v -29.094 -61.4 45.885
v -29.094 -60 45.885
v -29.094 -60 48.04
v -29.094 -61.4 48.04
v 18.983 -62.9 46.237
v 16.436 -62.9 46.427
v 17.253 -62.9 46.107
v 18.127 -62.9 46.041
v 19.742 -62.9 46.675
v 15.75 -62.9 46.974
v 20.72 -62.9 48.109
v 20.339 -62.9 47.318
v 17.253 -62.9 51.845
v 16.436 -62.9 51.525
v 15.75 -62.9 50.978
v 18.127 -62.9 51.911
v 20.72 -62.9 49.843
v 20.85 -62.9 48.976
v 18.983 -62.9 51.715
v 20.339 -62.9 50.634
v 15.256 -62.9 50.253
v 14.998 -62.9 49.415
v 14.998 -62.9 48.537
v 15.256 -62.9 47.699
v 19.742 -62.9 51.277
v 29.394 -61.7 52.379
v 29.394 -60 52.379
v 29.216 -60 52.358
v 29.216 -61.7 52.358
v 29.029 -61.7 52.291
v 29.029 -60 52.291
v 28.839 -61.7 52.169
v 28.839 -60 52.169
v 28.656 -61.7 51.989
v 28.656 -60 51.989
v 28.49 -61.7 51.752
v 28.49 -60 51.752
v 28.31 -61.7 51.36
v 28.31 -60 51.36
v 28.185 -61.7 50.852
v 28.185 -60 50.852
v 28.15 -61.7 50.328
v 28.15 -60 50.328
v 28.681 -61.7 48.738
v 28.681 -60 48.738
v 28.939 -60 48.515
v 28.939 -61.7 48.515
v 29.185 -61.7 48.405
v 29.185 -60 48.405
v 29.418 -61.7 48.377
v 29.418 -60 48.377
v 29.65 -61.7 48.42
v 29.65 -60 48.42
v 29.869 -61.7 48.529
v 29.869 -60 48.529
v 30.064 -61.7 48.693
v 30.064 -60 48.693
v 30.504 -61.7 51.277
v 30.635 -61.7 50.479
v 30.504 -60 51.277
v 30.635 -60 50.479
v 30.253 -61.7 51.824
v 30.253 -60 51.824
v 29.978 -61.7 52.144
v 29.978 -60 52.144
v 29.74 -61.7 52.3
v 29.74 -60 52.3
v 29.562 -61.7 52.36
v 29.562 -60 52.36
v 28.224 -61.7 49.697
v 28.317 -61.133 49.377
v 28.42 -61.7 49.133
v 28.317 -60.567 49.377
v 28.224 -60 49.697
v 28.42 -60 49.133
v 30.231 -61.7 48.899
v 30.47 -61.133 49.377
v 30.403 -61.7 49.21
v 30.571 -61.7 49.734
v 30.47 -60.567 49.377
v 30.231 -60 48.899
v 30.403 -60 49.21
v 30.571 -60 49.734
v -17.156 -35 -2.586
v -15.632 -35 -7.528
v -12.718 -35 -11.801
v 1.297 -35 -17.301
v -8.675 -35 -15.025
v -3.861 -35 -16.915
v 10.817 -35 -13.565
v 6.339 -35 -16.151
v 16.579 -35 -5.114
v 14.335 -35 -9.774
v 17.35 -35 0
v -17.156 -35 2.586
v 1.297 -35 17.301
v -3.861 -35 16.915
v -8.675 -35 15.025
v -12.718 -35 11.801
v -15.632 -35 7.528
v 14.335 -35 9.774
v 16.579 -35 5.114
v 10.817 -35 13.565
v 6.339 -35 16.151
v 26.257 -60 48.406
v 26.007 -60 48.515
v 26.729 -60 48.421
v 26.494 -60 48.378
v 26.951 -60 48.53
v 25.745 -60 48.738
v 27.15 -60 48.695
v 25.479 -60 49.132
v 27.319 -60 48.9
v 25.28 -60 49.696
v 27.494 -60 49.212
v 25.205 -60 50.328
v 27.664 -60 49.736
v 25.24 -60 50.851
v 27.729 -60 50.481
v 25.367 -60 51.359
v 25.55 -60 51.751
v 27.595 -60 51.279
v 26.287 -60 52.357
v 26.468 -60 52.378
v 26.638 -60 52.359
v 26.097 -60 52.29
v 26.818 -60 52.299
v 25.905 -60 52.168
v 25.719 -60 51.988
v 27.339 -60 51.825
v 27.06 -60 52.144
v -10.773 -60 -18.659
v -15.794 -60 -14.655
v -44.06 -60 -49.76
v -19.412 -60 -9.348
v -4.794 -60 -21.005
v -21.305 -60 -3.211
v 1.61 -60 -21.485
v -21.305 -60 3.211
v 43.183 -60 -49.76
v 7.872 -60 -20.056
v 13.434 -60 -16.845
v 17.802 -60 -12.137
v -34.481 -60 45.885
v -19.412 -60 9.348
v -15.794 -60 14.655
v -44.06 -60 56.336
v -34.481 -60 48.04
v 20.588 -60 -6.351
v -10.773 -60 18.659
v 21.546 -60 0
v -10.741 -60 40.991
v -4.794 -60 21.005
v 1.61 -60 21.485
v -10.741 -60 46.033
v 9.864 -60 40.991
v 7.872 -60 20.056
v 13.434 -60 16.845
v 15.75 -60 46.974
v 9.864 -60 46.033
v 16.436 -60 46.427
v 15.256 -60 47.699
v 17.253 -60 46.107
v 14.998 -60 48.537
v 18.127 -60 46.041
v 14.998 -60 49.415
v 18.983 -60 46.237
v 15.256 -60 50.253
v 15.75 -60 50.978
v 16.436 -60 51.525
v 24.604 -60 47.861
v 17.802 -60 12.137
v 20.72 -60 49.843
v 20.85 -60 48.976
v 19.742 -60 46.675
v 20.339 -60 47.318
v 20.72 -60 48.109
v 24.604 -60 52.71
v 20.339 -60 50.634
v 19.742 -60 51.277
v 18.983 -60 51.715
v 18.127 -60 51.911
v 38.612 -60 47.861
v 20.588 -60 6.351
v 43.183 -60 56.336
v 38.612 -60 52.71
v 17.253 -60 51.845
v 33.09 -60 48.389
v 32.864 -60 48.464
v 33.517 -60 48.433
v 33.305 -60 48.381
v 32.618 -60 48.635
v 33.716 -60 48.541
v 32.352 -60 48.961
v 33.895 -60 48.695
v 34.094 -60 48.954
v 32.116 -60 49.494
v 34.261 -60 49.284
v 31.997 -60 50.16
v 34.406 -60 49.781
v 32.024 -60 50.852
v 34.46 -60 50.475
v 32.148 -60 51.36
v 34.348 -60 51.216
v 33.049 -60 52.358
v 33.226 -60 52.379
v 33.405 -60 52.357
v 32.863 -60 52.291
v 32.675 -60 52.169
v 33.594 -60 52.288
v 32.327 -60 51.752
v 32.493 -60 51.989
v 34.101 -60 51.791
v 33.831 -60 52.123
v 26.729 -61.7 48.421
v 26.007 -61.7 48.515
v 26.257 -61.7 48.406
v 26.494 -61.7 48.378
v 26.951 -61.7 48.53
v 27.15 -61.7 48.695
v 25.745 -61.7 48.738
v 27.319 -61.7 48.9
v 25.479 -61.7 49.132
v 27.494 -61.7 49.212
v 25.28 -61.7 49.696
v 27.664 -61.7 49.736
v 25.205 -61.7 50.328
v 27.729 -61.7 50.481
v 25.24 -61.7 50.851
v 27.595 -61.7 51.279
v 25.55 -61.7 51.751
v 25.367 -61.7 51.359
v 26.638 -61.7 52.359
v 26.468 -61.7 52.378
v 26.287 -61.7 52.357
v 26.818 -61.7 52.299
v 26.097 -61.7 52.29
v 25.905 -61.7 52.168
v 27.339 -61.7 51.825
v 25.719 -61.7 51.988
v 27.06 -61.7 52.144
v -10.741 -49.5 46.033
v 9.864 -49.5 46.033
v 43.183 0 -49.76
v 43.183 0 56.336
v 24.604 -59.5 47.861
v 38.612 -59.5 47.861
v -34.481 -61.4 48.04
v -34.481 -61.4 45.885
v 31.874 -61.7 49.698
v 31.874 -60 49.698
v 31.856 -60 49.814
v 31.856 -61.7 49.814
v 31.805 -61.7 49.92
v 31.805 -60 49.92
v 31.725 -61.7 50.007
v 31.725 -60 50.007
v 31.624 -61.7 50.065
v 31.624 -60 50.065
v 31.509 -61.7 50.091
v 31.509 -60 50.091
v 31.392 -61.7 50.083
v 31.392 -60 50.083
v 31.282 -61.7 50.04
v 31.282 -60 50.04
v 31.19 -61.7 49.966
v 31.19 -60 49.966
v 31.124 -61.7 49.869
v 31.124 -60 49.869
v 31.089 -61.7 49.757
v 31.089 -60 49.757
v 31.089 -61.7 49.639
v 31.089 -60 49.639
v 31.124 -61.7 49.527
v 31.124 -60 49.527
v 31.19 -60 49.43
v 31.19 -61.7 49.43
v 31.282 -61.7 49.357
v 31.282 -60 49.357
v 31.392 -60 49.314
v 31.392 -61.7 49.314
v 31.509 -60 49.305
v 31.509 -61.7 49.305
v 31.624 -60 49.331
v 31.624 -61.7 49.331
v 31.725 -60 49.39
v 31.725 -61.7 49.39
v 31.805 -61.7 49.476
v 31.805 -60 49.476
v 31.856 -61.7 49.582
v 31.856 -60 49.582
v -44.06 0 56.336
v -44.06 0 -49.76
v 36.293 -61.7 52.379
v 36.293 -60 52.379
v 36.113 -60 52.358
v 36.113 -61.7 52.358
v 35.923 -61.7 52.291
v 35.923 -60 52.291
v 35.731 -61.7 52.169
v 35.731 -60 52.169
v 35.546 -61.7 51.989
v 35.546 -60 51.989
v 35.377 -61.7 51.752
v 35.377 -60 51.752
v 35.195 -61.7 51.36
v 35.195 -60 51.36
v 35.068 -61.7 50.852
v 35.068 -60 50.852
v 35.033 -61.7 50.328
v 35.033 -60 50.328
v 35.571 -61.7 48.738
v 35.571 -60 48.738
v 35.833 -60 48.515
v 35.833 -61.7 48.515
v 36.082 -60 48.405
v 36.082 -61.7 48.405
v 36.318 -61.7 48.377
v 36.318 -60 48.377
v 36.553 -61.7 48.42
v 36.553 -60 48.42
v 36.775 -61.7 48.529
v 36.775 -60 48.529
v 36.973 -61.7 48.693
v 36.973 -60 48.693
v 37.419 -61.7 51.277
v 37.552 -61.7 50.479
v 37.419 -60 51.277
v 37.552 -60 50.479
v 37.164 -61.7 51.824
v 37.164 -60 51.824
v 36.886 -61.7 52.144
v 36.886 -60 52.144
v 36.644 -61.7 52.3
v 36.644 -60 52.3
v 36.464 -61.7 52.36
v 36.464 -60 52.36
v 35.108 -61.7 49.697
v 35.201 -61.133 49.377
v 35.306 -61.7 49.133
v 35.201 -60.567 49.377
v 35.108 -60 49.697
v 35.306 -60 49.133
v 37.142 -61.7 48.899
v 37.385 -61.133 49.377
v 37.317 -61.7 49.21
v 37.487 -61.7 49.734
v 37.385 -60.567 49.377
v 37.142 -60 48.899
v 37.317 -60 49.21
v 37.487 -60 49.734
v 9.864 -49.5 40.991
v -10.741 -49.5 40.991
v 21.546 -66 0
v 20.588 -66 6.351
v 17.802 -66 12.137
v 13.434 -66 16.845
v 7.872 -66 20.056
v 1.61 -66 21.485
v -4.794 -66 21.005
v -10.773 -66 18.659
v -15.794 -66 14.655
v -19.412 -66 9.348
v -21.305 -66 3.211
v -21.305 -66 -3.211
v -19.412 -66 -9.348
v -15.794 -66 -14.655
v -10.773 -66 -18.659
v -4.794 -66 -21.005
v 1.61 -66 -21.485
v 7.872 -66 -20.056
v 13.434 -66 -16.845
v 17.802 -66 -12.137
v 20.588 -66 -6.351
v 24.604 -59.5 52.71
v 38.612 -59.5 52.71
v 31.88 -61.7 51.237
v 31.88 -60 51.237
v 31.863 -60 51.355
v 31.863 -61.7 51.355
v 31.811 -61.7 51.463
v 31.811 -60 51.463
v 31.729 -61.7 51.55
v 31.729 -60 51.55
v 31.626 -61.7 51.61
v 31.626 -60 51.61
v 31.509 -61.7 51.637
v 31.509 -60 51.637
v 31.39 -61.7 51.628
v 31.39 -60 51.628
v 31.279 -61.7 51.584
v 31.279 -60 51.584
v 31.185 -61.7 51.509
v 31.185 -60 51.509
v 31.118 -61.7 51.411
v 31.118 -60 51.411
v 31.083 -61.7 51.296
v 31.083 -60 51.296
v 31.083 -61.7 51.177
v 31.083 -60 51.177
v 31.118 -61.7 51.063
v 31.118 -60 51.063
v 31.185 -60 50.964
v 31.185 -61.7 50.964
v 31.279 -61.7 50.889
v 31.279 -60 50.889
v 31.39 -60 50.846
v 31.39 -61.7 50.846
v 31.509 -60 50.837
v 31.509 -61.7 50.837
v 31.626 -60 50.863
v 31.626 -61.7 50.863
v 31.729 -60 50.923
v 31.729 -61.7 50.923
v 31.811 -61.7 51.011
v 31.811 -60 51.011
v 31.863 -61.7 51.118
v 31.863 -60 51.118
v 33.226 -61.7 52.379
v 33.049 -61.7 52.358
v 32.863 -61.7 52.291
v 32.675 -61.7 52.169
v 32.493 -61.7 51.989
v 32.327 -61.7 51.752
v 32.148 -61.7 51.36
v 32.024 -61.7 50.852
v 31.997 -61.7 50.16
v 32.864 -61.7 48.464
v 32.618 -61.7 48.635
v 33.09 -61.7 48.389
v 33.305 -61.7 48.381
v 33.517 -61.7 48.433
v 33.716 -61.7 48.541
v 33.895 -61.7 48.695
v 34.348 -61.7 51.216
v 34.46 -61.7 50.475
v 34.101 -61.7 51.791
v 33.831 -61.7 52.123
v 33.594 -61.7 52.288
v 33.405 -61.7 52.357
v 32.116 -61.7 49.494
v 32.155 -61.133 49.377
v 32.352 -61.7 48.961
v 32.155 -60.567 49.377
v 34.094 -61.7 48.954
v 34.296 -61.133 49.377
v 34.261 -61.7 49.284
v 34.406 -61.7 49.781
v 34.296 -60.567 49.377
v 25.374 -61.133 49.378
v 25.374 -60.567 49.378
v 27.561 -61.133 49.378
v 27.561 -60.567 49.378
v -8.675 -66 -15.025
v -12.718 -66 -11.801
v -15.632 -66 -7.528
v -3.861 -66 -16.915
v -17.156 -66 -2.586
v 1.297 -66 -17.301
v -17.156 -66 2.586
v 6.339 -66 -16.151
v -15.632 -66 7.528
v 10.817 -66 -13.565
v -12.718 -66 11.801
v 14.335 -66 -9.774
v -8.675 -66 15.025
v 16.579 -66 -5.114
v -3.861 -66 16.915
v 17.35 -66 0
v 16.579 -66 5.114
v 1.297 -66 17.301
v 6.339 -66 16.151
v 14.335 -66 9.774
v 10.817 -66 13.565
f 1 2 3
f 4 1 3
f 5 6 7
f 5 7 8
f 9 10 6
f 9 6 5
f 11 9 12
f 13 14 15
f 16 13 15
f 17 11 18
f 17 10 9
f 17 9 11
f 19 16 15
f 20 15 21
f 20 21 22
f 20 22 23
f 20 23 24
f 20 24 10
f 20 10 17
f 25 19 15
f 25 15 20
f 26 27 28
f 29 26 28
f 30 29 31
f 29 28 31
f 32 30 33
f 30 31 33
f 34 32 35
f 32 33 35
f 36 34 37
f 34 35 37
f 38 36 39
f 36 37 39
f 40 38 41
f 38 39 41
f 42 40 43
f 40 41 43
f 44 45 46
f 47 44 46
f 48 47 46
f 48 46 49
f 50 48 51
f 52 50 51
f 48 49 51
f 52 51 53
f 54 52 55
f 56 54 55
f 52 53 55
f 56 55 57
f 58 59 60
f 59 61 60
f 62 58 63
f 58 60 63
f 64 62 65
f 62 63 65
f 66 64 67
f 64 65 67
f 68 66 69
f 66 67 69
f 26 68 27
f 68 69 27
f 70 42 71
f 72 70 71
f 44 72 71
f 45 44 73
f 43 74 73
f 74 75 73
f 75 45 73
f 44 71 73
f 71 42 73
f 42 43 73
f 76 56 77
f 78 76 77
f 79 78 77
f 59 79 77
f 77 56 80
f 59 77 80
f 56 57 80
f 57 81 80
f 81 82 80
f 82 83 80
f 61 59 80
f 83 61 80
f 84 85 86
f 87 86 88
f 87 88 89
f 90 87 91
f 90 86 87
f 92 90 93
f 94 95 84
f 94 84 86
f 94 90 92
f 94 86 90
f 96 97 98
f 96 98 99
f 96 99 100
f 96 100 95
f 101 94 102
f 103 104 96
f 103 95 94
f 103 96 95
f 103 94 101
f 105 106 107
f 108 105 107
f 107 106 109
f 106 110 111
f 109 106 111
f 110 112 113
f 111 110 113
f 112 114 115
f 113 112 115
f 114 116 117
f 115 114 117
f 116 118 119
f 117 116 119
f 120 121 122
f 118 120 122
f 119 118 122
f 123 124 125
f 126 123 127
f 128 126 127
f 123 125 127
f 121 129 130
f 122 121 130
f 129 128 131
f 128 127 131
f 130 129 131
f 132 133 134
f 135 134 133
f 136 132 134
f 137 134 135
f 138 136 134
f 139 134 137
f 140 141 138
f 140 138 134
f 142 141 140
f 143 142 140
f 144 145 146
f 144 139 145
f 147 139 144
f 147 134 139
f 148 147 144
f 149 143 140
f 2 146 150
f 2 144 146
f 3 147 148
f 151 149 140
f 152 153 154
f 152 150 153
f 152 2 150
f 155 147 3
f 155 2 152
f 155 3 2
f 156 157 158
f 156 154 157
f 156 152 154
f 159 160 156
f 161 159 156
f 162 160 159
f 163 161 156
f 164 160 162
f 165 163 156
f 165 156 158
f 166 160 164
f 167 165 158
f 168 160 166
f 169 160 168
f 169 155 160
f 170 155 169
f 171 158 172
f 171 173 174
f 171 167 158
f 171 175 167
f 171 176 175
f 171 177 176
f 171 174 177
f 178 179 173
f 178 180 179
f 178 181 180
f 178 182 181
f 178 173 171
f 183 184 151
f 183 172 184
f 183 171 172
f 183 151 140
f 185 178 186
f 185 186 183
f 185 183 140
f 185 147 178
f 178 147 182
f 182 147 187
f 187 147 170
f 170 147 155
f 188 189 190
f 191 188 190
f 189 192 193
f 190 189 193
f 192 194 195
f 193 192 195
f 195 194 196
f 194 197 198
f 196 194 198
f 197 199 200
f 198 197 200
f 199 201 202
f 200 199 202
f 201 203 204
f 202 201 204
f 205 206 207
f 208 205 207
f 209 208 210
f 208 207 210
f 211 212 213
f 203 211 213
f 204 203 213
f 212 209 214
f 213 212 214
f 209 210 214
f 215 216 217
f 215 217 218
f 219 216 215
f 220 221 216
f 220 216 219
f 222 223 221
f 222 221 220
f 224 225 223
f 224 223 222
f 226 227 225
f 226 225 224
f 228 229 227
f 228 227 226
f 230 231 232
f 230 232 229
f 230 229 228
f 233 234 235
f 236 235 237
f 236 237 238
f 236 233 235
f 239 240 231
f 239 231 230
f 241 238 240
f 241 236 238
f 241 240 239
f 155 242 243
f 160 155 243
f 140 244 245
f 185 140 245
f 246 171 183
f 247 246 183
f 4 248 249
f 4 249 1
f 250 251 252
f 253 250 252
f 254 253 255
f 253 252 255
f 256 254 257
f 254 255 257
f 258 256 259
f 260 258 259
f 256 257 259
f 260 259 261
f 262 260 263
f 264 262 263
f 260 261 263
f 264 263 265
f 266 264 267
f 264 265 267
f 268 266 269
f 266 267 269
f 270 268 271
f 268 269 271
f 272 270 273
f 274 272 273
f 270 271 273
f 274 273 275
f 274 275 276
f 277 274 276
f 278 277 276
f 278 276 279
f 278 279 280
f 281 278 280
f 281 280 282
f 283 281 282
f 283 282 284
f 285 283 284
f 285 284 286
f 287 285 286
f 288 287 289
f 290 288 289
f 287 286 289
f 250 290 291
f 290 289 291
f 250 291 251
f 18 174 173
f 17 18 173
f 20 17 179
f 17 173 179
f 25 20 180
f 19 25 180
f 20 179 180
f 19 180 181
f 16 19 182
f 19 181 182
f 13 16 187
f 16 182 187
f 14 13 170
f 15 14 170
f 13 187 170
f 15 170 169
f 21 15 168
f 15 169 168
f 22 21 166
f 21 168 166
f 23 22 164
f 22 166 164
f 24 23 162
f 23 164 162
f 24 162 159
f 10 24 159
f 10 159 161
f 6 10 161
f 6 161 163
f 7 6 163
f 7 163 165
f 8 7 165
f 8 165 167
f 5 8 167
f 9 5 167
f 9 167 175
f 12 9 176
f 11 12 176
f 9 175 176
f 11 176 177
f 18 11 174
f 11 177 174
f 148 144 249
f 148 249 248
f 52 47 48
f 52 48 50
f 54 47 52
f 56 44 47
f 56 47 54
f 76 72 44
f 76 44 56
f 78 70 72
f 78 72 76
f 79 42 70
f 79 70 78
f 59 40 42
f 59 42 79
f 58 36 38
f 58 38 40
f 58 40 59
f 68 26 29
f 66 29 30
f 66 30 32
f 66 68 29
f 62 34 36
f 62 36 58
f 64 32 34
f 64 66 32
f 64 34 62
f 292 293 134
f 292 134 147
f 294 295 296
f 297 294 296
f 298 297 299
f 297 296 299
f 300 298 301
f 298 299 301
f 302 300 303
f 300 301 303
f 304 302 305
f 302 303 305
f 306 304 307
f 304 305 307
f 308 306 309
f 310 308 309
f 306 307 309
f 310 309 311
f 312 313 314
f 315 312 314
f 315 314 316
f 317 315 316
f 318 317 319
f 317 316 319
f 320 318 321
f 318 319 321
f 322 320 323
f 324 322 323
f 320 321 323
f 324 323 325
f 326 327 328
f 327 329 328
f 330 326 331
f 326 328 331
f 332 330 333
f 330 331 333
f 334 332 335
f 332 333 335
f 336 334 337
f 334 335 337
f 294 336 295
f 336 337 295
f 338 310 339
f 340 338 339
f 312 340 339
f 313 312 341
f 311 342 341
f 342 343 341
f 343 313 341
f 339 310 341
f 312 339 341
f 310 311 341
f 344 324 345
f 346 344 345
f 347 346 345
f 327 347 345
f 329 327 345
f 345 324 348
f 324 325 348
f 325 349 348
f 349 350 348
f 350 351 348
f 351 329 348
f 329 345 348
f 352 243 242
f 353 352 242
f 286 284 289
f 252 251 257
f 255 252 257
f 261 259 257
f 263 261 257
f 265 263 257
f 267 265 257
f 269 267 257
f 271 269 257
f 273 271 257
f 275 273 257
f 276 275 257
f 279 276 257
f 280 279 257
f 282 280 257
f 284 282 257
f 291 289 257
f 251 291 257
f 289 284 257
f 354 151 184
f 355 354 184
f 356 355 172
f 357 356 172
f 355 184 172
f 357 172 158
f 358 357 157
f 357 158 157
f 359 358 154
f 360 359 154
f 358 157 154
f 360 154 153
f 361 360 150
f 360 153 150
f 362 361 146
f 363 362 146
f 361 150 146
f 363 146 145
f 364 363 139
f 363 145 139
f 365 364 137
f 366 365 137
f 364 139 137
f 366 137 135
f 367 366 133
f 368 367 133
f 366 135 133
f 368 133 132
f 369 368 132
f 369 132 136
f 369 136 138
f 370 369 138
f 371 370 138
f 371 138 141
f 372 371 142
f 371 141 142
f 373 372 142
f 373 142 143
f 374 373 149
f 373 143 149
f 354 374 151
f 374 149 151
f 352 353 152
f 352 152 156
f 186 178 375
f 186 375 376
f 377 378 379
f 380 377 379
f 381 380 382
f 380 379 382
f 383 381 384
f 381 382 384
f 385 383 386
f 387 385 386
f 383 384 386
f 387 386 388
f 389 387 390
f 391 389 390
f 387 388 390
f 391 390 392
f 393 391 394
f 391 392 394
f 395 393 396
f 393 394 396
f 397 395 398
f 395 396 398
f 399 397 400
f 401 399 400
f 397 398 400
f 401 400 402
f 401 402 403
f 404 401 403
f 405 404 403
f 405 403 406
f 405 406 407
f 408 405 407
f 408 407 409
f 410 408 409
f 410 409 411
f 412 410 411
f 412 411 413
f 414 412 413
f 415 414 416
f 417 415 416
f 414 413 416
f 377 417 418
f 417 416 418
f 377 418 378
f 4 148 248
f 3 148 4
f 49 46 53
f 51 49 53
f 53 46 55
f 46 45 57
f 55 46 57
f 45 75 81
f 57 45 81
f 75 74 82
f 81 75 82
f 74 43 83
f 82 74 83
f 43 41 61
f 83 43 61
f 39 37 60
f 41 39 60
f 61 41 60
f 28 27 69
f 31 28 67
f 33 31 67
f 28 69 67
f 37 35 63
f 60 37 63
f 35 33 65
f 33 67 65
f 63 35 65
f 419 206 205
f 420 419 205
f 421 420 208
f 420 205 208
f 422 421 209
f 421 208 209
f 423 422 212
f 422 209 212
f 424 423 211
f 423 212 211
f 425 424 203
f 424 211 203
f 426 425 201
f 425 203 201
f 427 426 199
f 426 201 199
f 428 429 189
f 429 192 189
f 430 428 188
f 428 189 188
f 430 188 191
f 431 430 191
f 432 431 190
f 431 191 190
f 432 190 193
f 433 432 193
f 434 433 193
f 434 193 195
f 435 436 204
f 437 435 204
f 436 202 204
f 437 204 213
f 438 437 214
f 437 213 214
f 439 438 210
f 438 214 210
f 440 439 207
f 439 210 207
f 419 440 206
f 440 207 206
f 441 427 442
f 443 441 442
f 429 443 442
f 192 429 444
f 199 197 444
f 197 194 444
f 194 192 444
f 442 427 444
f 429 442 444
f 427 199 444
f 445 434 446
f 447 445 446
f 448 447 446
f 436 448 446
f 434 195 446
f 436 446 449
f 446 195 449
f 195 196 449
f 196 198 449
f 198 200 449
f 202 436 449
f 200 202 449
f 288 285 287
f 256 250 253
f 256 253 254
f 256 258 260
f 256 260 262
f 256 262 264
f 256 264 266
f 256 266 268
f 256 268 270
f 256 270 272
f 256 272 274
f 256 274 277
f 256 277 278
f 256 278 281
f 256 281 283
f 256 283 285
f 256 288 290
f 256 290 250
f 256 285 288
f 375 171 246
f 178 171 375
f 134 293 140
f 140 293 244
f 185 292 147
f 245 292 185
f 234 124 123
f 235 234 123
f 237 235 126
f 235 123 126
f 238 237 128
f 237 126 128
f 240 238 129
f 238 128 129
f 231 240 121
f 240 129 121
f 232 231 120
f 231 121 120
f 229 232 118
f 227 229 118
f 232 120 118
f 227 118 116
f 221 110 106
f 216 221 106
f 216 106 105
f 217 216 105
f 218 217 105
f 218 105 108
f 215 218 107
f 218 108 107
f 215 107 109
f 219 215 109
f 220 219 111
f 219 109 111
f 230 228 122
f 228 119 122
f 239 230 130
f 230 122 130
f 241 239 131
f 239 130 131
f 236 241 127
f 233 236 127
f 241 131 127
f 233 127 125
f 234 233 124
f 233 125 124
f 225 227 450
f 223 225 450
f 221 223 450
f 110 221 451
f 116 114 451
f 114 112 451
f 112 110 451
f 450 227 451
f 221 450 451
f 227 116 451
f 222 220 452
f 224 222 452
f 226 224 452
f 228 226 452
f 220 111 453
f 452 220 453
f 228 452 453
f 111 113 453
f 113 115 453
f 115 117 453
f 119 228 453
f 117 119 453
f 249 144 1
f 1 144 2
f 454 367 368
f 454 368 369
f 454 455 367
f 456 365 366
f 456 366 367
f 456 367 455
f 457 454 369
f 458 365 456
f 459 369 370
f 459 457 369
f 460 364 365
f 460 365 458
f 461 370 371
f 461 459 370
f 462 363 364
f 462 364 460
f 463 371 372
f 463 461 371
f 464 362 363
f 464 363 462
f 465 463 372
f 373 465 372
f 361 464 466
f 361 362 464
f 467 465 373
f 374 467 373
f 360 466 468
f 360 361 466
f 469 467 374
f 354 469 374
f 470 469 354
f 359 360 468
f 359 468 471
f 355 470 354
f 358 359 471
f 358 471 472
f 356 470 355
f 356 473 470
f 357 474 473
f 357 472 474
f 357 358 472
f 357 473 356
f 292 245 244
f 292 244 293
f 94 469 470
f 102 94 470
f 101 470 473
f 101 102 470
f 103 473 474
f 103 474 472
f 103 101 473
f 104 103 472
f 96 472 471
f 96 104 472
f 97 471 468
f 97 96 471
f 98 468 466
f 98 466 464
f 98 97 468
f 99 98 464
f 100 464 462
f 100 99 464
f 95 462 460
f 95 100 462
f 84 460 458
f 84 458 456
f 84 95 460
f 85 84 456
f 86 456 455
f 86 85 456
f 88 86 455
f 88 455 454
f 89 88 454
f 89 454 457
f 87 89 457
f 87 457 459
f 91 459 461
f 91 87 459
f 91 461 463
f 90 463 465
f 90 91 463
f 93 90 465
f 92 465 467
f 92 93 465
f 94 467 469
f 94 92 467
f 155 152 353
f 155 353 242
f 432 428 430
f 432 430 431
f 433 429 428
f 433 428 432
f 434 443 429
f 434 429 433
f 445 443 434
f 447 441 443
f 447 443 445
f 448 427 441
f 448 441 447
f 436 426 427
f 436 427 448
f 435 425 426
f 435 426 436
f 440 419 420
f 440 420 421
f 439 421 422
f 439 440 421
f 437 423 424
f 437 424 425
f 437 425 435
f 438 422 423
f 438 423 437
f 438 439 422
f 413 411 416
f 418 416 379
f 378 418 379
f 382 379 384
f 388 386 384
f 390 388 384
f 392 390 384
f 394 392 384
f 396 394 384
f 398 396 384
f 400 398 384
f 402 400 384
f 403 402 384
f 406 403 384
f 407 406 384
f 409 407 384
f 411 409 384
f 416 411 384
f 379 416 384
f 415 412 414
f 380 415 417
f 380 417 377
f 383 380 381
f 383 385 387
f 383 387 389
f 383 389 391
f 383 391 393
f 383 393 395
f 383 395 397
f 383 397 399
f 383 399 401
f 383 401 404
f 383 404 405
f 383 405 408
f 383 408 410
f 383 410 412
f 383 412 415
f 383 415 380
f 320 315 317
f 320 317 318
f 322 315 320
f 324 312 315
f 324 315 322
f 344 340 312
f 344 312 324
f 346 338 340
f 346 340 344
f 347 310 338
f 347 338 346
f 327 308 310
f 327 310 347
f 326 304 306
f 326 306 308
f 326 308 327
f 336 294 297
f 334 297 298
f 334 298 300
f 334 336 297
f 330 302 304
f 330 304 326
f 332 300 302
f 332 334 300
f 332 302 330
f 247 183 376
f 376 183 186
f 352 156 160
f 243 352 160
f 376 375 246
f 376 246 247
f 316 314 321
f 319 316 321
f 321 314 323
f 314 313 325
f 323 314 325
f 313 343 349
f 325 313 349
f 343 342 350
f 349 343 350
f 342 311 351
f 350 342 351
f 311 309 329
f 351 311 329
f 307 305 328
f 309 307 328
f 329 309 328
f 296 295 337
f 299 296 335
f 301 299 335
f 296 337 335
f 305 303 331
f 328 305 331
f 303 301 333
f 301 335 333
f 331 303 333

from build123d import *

# Parameters (mm, degrees)
F0_W      = 87.2437804937
F0_H      = 106.0954518616
F0_W_2    = 20.6053154543
F0_H_2    = 5.0417296588
F1_DEPTH  = 60
F2_R      = 2.9428750277
F3_DEPTH  = 2.9
F4_W      = 13.8082224876
F4_H      = 4.3150708079
F5_DEPTH  = 0.7
F6_W      = 12.7294529229
F6_H      = 4.7465749085
F7_DEPTH  = 1.8
F8_W      = 20.6053154543
F8_H      = 5.0417296588
F9_DEPTH  = 5.2
F8_W_2    = 14.0079837292
F8_H_2    = 4.8489198089
F10_DEPTH = 0.5
F11_W     = 5.3876843303
F11_H     = 2.1550767124
F12_DEPTH = 1.4
F13_R     = 17.3499194153
F14_DEPTH = 25
F13_R_2   = 21.5456901686
F15_DEPTH = 6
F16_W     = 20.6053154543
F16_H     = 5.0417296588
F17_DEPTH = 49.5
F19_DEPTH = 1.7
F18_R     = 0.4009979828
F18_R_2   = 0.3943904749


with BuildPart() as f1:
    # F0 (on Front) → F1 (new body)
    with BuildSketch(Plane.XZ):
        with Locations((-0.4384107888, 3.2880846411)):
            Rectangle(F0_W, F0_H)
        with Locations((-0.4384112544, 43.5122866184)):
            Rectangle(F0_W_2, F0_H_2, mode=Mode.SUBTRACT)
    extrude(amount=F1_DEPTH)

    # F2 (on face) → F3 (join)
    with BuildSketch(Plane.XZ.offset(60)):
        with Locations((17.9075337946, 48.9760264754)):
            Circle(F2_R)
    extrude(amount=F3_DEPTH)

    # F4 (on face) → F5 (join)
    with BuildSketch(Plane.XZ.offset(60)):
        with Locations((31.2842493877, 50.4863038659)):
            Rectangle(F4_W, F4_H)
    extrude(amount=-F5_DEPTH)

    # F6 (on face) → F7 (join)
    with BuildSketch(Plane.XZ.offset(60)):
        with Locations((30.7448646054, 50.2705518156)):
            Rectangle(F6_W, F6_H)
    extrude(amount=-F7_DEPTH)

    # F8 (on face) → F9 (cut)
    with BuildSketch(Plane.XZ.offset(60)):
        with Locations((-0.4384112544, 43.5122866184)):
            Rectangle(F8_W, F8_H)
    extrude(amount=-F9_DEPTH, mode=Mode.SUBTRACT)

    # F8 (on face) → F10 (cut)
    with BuildSketch(Plane.XZ.offset(60)):
        with Locations((31.6077554598, 50.285063684)):
            Rectangle(F8_W_2, F8_H_2)
    extrude(amount=-F10_DEPTH, mode=Mode.SUBTRACT)

    # F11 (on face) → F12 (join)
    with BuildSketch(Plane.XZ.offset(60)):
        with Locations((-31.7873442546, 46.9626579434)):
            Rectangle(F11_W, F11_H)
    extrude(amount=F12_DEPTH)

    # F13 (on face) → F14 (cut)
    with BuildSketch(Plane.XZ.offset(60)):
        Circle(F13_R)
    extrude(amount=-F14_DEPTH, mode=Mode.SUBTRACT)

    # F13 (on face) → F15 (join)
    with BuildSketch(Plane.XZ.offset(60)):
        Circle(F13_R_2)
        Circle(F13_R, mode=Mode.SUBTRACT)
    extrude(amount=F15_DEPTH)

    # F16 (on face) → F17 (join)
    with BuildSketch(Plane(origin=(0, 0, 0), x_dir=(-1, 0, 0), z_dir=(0, 1, 0))):
        with Locations((0.4384112544, 43.5122866184)):
            Rectangle(F16_W, F16_H)
    extrude(amount=-F17_DEPTH)


with BuildPart() as f19:
    # F18 (on face) → F19 (new body)
    with BuildSketch(Plane.XZ.offset(60)):
        with BuildLine():
            add(Edge.make_bspline(
                [(26.4675728977, 52.3777563572), (24.279883543, 52.3777563572), (25.3737282203, 49.3777563572), (26.4675728977, 46.3777563572), (27.561417575, 49.3777563572), (28.6552622524, 52.3777563572), (26.4675728977, 52.3777563572)],
                knots=[0, 0, 0, 2.0943951024, 2.0943951024, 4.1887902048, 4.1887902048, 6.2831853072, 6.2831853072, 6.2831853072], degree=2, weights=[1, 0.5, 1, 0.5, 1, 0.5, 1]))
        make_face()
    extrude(amount=F19_DEPTH)


with BuildPart() as f19b:
    # F18 (on face) → F19, piece 2 (new body)
    with BuildSketch(Plane.XZ.offset(60)):
        with BuildLine():
            add(Edge.make_bspline(
                [(29.393510893, 52.3787215352), (27.2396173202, 52.3787215352), (28.3165641066, 49.3772737682), (29.393510893, 46.3758260012), (30.4704576794, 49.3772737682), (31.5474044657, 52.3787215352), (29.393510893, 52.3787215352)],
                knots=[0, 0, 0, 2.0943951024, 2.0943951024, 4.1887902048, 4.1887902048, 6.2831853072, 6.2831853072, 6.2831853072], degree=2, weights=[1, 0.5, 1, 0.5, 1, 0.5, 1]))
        make_face()
    extrude(amount=F19_DEPTH)


with BuildPart() as f19c:
    # F18 (on face) → F19, piece 3 (new body)
    with BuildSketch(Plane.XZ.offset(60)):
        with Locations((31.479422003, 51.2366630137)):
            Circle(F18_R)
    extrude(amount=F19_DEPTH)


with BuildPart() as f19d:
    # F18 (on face) → F19, piece 4 (new body)
    with BuildSketch(Plane.XZ.offset(60)):
        with Locations((31.479422003, 49.6981851757)):
            Circle(F18_R_2)
    extrude(amount=F19_DEPTH)


with BuildPart() as f19e:
    # F18 (on face) → F19, piece 5 (new body)
    with BuildSketch(Plane.XZ.offset(60)):
        with BuildLine():
            add(Edge.make_bspline(
                [(33.2255475223, 52.3787215352), (31.0842078806, 52.3787215352), (32.1548777014, 49.3772737682), (33.2255475223, 46.3758260012), (34.2962173432, 49.3772737682), (35.3668871641, 52.3787215352), (33.2255475223, 52.3787215352)],
                knots=[0, 0, 0, 2.0943951024, 2.0943951024, 4.1887902048, 4.1887902048, 6.2831853072, 6.2831853072, 6.2831853072], degree=2, weights=[1, 0.5, 1, 0.5, 1, 0.5, 1]))
        make_face()
    extrude(amount=F19_DEPTH)


with BuildPart() as f19f:
    # F18 (on face) → F19, piece 6 (new body)
    with BuildSketch(Plane.XZ.offset(60)):
        with BuildLine():
            add(Edge.make_bspline(
                [(36.2930633128, 52.3787215352), (34.1097765359, 52.3787215352), (35.2014199243, 49.3772737682), (36.2930633128, 46.3758260012), (37.3847067012, 49.3772737682), (38.4763500896, 52.3787215352), (36.2930633128, 52.3787215352)],
                knots=[0, 0, 0, 2.0943951024, 2.0943951024, 4.1887902048, 4.1887902048, 6.2831853072, 6.2831853072, 6.2831853072], degree=2, weights=[1, 0.5, 1, 0.5, 1, 0.5, 1]))
        make_face()
    extrude(amount=F19_DEPTH)


solid = Compound([f1.part, f19.part, f19b.part, f19c.part, f19d.part, f19e.part, f19f.part])
